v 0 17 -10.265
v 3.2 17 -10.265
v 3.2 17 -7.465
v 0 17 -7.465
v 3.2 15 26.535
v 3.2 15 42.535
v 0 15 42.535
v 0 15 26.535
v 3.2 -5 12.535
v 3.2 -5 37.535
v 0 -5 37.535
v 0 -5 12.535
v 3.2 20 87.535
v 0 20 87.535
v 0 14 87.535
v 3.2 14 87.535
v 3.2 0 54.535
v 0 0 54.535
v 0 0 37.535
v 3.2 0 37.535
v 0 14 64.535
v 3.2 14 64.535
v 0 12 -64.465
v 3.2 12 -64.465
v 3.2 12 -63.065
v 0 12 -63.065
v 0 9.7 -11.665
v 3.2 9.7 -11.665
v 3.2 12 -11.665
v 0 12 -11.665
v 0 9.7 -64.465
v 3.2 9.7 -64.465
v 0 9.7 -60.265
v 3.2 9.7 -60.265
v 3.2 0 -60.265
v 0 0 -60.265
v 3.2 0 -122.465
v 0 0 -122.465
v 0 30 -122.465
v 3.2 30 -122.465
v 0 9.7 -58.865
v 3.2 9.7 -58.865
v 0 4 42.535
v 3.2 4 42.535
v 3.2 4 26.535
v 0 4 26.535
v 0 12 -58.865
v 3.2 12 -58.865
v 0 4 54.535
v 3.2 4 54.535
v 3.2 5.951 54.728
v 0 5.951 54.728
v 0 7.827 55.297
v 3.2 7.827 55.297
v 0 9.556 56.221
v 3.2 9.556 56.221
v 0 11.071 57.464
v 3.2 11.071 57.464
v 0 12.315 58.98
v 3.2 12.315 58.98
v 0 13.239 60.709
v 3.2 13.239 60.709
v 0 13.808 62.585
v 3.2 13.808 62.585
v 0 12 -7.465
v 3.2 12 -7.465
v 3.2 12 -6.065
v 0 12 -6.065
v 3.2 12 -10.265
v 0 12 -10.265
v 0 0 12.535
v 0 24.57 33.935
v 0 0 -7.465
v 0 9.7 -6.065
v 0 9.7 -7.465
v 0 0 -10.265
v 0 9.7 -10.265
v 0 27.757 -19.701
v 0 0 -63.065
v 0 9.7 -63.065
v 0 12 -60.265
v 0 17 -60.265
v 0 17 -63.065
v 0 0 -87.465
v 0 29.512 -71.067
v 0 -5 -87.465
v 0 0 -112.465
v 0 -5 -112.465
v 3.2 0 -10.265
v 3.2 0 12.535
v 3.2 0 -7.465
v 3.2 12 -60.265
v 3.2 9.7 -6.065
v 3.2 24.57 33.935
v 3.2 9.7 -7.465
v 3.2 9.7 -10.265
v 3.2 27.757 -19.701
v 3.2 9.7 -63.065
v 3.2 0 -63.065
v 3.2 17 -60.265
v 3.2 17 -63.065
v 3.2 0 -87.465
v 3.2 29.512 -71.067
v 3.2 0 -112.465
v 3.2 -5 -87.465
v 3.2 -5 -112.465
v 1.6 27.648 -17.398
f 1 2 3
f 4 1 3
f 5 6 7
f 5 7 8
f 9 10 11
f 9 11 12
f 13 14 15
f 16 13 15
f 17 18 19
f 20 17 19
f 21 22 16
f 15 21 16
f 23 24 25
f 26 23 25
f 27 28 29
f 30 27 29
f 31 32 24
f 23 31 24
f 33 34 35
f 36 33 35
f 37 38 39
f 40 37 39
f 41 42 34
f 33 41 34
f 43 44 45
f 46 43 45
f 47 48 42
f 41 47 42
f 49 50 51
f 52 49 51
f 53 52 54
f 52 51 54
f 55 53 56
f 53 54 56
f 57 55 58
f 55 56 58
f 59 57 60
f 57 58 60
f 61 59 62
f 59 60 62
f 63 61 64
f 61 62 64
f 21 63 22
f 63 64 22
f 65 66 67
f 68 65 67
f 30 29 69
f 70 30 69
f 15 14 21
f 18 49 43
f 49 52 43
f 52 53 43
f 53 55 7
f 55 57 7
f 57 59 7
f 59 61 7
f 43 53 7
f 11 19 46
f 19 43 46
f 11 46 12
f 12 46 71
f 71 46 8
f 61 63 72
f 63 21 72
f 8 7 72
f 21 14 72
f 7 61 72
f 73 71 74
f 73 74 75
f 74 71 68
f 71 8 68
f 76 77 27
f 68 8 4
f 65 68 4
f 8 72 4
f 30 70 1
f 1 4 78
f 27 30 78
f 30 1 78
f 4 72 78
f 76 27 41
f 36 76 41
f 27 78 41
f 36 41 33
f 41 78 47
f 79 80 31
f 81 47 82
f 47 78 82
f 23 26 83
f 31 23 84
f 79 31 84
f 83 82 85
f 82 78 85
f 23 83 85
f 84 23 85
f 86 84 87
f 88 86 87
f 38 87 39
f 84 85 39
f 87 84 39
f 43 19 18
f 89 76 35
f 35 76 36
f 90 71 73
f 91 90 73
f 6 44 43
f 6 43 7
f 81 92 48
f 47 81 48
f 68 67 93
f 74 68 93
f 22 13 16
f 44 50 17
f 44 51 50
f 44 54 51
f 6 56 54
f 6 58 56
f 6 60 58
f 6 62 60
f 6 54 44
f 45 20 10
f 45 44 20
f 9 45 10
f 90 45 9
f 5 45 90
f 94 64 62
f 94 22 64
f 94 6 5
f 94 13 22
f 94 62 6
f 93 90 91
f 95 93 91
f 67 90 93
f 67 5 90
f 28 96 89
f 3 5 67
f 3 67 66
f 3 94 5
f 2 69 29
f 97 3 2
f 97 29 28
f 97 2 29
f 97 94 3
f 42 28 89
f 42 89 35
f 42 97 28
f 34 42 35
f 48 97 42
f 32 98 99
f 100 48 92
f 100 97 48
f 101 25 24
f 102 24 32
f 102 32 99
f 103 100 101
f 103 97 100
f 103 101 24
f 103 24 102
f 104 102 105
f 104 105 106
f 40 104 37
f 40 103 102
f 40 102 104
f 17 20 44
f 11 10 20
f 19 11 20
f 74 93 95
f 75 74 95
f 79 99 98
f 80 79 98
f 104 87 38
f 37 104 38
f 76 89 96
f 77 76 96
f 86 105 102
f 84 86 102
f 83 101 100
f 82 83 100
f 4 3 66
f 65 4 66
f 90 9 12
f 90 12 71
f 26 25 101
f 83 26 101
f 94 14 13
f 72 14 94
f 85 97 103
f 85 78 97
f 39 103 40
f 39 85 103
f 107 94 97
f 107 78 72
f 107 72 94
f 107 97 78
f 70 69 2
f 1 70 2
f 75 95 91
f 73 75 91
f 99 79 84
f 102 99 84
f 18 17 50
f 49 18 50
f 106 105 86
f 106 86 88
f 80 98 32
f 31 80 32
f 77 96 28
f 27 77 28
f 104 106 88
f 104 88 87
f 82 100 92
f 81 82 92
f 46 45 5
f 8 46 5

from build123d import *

# Parameters (mm, degrees)
MAIN_DEPTH        = 3.2
WHEEL_DEPTH       = 3.2
SKETCH3_W         = 25
SKETCH3_H         = 5
TABS_DEPTH        = 3.2
SCREW_HOLES_DEPTH = 3.2
SKETCH6_W         = 16
SKETCH6_H         = 11
USB_HOLE_DEPTH    = 3.2


with BuildPart() as part:
    # Sketch1 → main (new body)
    with BuildSketch(Plane(origin=(0, 0, 0), x_dir=(0, 0, -1), z_dir=(1, 0, 0))):
        with BuildLine():
            Line((-87.535437106, 0), (122.464562894, 0))
            Line((122.464562894, 0), (122.464562894, 30))
            add(Edge.make_bspline(
                [(-87.535437106, 20), (17.331032425, 30.296907598), (122.464562894, 30)],
                knots=[0, 0, 0, 1, 1, 1], degree=2))
            Line((-87.535437106, 20), (-87.535437106, 0))
        make_face()
    extrude(amount=MAIN_DEPTH)

    # Sketch2 → wheel (cut)
    with BuildSketch(Plane(origin=(3.2, 0, 0), x_dir=(0, 0, -1), z_dir=(1, 0, 0))):
        with BuildLine():
            Line((-87.535437106, 0), (-54.535437106, 0))
            Line((-54.535437106, 0), (-54.535437106, 4))
            ThreePointArc((-54.535437106, 4), (-57.464369294, 11.071067812), (-64.535437106, 14))
            Line((-64.535437106, 14), (-87.535437106, 14))
            Line((-87.535437106, 14), (-87.535437106, 0))
        make_face()
    extrude(amount=-WHEEL_DEPTH, mode=Mode.SUBTRACT)

    # Sketch3 → tabs (add)
    with BuildSketch(Plane(origin=(3.2, 0, 0), x_dir=(0, 0, -1), z_dir=(1, 0, 0))):
        with Locations((-25.035437106, -2.5)):
            Rectangle(SKETCH3_W, SKETCH3_H)
        with Locations((99.964562894, -2.5)):
            Rectangle(SKETCH3_W, SKETCH3_H)
    extrude(amount=-TABS_DEPTH)

    # Sketch5 → screw holes (cut)
    with BuildSketch(Plane(origin=(3.2, 0, 0), x_dir=(0, 0, -1), z_dir=(1, 0, 0))):
        Polygon((7.464562894, 0), (10.264562894, 0), (10.264562894, 9.7), (11.664562894, 9.7), (11.664562894, 12), (10.264562894, 12), (10.264562894, 17), (7.464562894, 17), (7.464562894, 12), (6.064562894, 12), (6.064562894, 9.7), (7.464562894, 9.7), align=None)
        Polygon((60.264562894, 0), (63.064562894, 0), (63.064562894, 9.7), (64.464562894, 9.7), (64.464562894, 12), (63.064562894, 12), (63.064562894, 17), (60.264562894, 17), (60.264562894, 12), (58.864562894, 12), (58.864562894, 9.7), (60.264562894, 9.7), align=None)
    extrude(amount=-SCREW_HOLES_DEPTH, mode=Mode.SUBTRACT)

    # Sketch6 → USB hole (cut)
    with BuildSketch(Plane(origin=(3.2, 0, 0), x_dir=(0, 0, -1), z_dir=(1, 0, 0))):
        with Locations((-34.535437106, 9.5)):
            Rectangle(SKETCH6_W, SKETCH6_H)
    extrude(amount=-USB_HOLE_DEPTH, mode=Mode.SUBTRACT)


solid = part.part
